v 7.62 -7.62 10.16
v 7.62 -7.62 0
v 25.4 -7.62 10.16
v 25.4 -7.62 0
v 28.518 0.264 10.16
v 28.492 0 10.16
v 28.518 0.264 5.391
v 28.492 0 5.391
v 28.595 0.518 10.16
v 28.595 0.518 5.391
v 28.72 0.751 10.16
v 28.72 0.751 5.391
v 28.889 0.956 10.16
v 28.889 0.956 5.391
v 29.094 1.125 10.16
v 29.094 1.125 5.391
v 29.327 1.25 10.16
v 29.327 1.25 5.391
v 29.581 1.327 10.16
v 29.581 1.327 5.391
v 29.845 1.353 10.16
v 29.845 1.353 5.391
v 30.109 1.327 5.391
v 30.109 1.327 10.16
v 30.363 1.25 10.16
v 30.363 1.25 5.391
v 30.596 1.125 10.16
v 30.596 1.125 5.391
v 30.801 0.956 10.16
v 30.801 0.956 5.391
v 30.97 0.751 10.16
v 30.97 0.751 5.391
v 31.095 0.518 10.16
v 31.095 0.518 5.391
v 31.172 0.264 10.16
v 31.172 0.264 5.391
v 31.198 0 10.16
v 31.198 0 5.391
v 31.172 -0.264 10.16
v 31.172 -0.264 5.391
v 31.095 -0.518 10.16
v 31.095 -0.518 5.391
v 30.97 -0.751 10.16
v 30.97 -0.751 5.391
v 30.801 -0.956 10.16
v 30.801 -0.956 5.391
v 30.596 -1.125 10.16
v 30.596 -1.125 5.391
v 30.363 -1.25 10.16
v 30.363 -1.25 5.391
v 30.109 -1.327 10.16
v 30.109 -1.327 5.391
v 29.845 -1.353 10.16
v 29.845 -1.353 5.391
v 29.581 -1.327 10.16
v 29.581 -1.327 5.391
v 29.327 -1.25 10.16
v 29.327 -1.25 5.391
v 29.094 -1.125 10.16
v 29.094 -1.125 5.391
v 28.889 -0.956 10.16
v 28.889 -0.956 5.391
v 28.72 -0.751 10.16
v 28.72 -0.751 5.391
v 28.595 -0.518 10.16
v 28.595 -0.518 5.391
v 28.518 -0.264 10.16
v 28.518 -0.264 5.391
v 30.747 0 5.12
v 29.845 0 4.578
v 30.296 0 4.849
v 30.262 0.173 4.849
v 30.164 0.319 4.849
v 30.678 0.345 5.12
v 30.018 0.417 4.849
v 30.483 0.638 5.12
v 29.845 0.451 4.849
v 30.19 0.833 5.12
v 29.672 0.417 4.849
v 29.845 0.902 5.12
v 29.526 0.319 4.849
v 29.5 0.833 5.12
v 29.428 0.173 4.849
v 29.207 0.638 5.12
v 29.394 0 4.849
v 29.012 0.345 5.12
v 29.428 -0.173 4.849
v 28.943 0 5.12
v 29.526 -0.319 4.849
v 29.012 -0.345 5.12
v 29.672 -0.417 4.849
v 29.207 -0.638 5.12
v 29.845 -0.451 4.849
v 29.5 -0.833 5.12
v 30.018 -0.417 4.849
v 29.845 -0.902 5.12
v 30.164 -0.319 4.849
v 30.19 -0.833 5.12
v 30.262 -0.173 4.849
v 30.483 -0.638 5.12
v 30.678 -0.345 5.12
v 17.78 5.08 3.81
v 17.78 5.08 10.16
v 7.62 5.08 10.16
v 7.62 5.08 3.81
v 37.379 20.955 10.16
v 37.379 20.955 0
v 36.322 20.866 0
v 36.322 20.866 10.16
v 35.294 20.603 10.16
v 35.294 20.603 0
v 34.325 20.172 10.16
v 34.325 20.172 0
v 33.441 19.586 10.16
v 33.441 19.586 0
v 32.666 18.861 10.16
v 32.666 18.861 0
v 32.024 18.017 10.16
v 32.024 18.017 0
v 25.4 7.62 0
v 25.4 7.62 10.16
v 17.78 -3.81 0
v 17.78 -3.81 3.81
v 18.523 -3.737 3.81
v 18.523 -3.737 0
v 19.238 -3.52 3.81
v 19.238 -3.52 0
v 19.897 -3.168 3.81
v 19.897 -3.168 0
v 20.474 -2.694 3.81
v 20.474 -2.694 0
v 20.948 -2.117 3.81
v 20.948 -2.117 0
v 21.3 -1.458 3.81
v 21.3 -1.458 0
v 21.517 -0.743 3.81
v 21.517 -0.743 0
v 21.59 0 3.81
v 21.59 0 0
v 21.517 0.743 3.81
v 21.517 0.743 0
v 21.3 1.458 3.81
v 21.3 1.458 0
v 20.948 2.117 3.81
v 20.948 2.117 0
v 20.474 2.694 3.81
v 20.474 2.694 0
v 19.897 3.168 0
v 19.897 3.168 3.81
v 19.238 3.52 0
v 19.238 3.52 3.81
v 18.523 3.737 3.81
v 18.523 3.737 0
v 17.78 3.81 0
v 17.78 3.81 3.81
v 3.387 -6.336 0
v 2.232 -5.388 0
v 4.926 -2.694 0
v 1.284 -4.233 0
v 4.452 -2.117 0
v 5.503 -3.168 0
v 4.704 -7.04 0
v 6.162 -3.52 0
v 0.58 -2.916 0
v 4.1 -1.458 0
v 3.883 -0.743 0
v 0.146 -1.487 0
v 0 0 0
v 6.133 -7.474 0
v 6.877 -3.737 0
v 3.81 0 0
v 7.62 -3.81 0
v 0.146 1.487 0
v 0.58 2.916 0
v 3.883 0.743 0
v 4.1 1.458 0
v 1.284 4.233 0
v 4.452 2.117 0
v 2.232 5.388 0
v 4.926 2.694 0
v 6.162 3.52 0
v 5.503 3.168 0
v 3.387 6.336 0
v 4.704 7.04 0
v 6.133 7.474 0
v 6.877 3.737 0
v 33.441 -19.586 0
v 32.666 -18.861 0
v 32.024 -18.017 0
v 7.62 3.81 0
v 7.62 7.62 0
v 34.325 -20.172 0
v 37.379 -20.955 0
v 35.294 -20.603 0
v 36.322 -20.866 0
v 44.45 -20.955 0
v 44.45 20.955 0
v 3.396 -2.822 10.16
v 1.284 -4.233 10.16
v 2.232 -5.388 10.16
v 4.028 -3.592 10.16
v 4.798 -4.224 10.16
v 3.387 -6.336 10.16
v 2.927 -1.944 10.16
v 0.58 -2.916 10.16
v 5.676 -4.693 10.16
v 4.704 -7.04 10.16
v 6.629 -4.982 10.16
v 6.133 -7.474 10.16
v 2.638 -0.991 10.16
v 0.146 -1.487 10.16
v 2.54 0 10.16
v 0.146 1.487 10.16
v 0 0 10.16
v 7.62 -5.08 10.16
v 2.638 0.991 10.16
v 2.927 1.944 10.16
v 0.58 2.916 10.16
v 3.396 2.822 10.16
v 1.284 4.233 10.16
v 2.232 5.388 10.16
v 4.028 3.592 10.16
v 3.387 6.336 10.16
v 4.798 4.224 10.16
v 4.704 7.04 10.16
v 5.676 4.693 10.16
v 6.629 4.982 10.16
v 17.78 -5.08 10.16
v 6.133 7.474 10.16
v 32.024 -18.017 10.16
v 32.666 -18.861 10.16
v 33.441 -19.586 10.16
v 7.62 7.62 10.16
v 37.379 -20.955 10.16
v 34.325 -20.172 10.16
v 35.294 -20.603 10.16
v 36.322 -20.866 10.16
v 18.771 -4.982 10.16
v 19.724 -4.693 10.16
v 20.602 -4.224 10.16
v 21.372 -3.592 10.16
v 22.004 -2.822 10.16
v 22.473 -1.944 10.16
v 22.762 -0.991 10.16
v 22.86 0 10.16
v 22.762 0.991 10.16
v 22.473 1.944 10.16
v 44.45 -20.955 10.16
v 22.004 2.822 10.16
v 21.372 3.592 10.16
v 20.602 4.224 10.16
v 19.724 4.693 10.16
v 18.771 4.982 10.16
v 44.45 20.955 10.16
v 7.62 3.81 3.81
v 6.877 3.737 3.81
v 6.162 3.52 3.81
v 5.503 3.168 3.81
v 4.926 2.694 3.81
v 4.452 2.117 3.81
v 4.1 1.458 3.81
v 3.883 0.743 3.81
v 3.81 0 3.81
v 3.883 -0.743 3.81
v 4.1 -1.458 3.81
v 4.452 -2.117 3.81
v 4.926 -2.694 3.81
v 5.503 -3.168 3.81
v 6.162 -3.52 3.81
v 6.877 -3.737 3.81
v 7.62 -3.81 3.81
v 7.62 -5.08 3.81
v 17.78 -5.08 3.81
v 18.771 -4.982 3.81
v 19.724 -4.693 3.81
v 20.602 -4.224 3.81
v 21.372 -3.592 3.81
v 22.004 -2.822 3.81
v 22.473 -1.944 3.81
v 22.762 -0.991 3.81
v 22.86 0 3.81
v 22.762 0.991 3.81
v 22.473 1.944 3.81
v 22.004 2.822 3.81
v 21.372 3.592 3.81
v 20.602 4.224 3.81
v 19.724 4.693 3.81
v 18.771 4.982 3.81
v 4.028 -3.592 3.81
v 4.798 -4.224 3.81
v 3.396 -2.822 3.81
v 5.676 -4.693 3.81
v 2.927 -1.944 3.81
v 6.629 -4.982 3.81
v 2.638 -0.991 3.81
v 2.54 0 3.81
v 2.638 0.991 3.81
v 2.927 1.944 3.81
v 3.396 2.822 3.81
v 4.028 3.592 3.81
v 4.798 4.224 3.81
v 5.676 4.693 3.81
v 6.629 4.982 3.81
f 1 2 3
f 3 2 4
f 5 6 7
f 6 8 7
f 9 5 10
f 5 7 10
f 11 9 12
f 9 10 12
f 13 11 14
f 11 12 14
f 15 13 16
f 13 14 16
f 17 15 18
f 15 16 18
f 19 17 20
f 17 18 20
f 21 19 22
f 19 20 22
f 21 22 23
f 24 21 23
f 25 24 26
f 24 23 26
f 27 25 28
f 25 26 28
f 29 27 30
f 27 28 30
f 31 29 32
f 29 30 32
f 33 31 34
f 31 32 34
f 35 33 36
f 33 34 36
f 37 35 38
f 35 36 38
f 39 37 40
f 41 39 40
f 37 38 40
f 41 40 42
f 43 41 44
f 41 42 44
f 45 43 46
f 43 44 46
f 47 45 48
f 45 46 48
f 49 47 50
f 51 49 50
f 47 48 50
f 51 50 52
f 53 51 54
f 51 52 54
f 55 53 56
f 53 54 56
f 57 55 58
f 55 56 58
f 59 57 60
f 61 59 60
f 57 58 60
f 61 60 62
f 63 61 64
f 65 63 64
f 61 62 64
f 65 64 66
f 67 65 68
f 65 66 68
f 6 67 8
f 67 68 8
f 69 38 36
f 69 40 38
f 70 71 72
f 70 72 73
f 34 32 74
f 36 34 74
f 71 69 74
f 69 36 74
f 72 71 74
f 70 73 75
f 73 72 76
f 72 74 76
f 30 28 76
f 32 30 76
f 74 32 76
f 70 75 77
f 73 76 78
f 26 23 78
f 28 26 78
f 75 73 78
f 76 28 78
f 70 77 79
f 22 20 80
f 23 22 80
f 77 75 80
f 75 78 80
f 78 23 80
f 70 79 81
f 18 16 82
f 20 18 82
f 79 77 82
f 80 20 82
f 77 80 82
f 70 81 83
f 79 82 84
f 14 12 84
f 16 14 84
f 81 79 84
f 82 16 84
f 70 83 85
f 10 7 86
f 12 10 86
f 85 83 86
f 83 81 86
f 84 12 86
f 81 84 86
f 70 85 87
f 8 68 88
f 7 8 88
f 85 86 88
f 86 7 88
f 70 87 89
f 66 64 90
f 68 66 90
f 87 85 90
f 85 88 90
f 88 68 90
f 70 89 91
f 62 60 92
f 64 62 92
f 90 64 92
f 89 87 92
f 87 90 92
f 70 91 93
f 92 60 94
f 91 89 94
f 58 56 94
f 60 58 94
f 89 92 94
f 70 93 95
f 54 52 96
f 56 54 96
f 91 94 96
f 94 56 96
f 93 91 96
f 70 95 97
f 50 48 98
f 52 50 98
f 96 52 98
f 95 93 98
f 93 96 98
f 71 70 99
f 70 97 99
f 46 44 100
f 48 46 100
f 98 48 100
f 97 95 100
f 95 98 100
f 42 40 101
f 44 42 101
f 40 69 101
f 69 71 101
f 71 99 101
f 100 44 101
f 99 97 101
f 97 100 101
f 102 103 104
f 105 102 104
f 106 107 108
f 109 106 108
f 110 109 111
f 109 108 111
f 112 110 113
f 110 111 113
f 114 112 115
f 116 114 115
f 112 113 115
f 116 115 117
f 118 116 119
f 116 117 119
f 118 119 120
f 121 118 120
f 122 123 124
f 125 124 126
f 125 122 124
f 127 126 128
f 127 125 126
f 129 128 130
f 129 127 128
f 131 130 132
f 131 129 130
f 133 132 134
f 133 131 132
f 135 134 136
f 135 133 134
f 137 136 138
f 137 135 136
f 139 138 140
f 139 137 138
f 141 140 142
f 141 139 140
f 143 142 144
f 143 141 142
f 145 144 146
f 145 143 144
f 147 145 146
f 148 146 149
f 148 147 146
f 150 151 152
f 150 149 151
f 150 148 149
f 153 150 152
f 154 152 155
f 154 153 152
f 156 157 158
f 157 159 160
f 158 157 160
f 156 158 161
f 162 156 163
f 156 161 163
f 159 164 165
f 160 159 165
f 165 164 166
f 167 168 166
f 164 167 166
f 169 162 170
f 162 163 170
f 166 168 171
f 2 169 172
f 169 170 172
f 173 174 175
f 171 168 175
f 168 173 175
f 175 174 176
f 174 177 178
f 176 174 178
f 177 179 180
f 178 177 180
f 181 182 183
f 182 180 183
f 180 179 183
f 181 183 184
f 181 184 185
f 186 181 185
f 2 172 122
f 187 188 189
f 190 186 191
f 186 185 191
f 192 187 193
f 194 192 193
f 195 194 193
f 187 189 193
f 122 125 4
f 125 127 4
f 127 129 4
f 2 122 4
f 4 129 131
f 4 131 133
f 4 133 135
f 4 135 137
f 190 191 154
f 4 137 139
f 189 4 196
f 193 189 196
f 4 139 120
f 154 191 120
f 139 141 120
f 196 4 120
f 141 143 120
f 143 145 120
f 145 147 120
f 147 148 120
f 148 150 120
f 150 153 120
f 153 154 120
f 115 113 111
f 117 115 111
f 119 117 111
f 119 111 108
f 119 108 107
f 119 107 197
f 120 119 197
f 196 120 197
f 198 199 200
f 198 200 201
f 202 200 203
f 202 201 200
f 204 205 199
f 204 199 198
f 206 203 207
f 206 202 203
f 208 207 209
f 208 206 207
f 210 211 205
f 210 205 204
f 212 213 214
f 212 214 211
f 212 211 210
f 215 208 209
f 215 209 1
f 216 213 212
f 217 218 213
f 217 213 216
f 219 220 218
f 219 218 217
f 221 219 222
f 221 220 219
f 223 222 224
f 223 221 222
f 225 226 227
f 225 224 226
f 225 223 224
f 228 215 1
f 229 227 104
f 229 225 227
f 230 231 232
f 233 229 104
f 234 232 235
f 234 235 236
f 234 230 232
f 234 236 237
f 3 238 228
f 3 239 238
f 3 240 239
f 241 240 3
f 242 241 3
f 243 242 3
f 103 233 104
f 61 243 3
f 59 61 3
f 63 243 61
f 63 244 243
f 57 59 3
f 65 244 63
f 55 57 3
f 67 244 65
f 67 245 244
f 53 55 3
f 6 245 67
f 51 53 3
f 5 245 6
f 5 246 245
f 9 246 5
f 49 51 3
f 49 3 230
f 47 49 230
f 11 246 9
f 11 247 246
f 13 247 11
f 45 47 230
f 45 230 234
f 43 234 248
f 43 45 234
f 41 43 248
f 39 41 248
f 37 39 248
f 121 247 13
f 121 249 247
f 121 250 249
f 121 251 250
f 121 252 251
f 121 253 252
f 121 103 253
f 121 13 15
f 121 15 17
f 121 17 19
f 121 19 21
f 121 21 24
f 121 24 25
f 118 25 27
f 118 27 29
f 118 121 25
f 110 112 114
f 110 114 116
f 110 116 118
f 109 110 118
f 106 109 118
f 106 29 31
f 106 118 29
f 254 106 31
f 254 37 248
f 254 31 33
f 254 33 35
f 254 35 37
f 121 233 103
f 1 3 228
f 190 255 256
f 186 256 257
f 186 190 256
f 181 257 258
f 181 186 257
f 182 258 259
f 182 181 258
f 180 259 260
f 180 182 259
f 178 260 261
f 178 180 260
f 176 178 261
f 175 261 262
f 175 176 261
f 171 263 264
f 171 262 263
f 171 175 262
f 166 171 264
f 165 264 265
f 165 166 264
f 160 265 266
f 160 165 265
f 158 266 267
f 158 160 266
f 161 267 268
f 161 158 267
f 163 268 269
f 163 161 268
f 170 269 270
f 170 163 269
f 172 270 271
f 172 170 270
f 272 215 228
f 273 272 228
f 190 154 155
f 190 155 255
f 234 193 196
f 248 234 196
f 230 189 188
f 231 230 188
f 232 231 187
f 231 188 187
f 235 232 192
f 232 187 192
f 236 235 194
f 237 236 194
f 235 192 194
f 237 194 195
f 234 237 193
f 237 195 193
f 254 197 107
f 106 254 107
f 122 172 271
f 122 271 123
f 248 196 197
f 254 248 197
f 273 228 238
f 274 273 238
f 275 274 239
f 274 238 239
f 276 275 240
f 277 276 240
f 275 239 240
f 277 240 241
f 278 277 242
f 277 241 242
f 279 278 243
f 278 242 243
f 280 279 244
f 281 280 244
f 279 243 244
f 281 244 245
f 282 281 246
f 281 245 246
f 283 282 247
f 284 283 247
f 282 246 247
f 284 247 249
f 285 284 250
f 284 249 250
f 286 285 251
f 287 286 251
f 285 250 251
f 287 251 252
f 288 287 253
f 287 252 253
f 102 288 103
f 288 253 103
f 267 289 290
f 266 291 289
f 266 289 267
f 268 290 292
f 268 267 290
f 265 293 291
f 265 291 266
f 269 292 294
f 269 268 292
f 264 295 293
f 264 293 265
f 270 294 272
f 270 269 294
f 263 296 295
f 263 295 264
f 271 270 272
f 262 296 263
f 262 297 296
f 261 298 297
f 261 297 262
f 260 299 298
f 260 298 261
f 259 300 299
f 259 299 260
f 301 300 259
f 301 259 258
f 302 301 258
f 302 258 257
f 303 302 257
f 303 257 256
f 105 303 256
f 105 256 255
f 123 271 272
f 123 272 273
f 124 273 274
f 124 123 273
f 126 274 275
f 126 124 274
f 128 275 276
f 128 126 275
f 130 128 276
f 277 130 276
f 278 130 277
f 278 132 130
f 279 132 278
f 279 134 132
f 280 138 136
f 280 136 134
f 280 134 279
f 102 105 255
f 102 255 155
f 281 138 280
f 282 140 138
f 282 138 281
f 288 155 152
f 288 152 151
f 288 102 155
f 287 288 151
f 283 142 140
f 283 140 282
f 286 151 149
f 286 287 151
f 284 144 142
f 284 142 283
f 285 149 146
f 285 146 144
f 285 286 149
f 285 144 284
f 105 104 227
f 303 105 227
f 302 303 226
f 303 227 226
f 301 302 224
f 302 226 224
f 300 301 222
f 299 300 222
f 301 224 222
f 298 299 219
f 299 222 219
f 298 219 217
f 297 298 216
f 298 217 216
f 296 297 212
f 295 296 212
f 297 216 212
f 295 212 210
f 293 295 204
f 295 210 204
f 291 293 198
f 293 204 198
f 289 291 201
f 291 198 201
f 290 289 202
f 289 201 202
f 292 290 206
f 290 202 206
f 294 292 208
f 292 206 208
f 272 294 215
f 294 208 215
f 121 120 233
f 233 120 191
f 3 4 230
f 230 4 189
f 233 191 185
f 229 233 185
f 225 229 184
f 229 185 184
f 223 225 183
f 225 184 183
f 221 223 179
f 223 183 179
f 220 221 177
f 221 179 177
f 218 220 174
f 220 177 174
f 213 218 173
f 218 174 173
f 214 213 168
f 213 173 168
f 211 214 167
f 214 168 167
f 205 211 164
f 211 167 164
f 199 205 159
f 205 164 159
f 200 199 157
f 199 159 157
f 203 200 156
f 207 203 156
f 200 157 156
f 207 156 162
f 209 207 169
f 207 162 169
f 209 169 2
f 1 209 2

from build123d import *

# Parameters (mm, degrees)
F1_DEPTH = 10.16
F3_DEPTH = 6.35
F5_DEPTH = 10.161
F7_D     = 2.7051
F7_DEPTH = 4.76885
F7_TIP   = 0.8126940303


with BuildPart() as f1:
    # F0 (on Top) → F1 (new body)
    with BuildSketch(Plane.XY):
        with BuildLine():
            Line((25.4, 7.62), (7.62, 7.62))
            ThreePointArc((7.62, 7.62), (0, 0), (7.62, -7.62))
            Line((7.62, -7.62), (25.4, -7.62))
            Line((25.4, -7.62), (32.023525542, -18.016852513))
            ThreePointArc((32.023525542, -18.016852513), (34.3247825403, -20.1722148987), (37.3790612229, -20.955))
            Line((37.3790612229, -20.955), (44.45, -20.955))
            Line((44.45, -20.955), (44.45, 20.955))
            Line((44.45, 20.955), (37.3790612229, 20.955))
            ThreePointArc((37.3790612229, 20.955), (34.3247825403, 20.1722148987), (32.023525542, 18.016852513))
            Line((32.023525542, 18.016852513), (25.4, 7.62))
        make_face()
    extrude(amount=F1_DEPTH)

    # F2 (on face) → F3 (cut)
    with BuildSketch(Plane.XY.offset(10.16)):
        with BuildLine():
            ThreePointArc((7.62, 5.08), (2.54, 0), (7.62, -5.08))
            Line((7.62, -5.08), (17.78, -5.08))
            ThreePointArc((17.78, -5.08), (22.86, 0), (17.78, 5.08))
            Line((17.78, 5.08), (7.62, 5.08))
        make_face()
    extrude(amount=-F3_DEPTH, mode=Mode.SUBTRACT)

    # F4 (on Top) → F5 (cut, through all)
    with BuildSketch(Plane.XY):
        with BuildLine():
            ThreePointArc((7.62, 3.81), (3.81, 0), (7.62, -3.81))
            Line((7.62, -3.81), (17.78, -3.81))
            ThreePointArc((17.78, -3.81), (21.59, 0), (17.78, 3.81))
            Line((17.78, 3.81), (7.62, 3.81))
        make_face()
    extrude(amount=F5_DEPTH, mode=Mode.SUBTRACT)

    # F7
    with Locations(Plane.XY.offset(10.16)):
        with Locations((29.845, 0)):
            Hole(F7_D / 2, depth=F7_DEPTH)
            with Locations((0, 0, -(F7_DEPTH + F7_TIP / 2))):  # 118° drill point
                Cone(0, F7_D / 2, F7_TIP, mode=Mode.SUBTRACT)


solid = f1.part
